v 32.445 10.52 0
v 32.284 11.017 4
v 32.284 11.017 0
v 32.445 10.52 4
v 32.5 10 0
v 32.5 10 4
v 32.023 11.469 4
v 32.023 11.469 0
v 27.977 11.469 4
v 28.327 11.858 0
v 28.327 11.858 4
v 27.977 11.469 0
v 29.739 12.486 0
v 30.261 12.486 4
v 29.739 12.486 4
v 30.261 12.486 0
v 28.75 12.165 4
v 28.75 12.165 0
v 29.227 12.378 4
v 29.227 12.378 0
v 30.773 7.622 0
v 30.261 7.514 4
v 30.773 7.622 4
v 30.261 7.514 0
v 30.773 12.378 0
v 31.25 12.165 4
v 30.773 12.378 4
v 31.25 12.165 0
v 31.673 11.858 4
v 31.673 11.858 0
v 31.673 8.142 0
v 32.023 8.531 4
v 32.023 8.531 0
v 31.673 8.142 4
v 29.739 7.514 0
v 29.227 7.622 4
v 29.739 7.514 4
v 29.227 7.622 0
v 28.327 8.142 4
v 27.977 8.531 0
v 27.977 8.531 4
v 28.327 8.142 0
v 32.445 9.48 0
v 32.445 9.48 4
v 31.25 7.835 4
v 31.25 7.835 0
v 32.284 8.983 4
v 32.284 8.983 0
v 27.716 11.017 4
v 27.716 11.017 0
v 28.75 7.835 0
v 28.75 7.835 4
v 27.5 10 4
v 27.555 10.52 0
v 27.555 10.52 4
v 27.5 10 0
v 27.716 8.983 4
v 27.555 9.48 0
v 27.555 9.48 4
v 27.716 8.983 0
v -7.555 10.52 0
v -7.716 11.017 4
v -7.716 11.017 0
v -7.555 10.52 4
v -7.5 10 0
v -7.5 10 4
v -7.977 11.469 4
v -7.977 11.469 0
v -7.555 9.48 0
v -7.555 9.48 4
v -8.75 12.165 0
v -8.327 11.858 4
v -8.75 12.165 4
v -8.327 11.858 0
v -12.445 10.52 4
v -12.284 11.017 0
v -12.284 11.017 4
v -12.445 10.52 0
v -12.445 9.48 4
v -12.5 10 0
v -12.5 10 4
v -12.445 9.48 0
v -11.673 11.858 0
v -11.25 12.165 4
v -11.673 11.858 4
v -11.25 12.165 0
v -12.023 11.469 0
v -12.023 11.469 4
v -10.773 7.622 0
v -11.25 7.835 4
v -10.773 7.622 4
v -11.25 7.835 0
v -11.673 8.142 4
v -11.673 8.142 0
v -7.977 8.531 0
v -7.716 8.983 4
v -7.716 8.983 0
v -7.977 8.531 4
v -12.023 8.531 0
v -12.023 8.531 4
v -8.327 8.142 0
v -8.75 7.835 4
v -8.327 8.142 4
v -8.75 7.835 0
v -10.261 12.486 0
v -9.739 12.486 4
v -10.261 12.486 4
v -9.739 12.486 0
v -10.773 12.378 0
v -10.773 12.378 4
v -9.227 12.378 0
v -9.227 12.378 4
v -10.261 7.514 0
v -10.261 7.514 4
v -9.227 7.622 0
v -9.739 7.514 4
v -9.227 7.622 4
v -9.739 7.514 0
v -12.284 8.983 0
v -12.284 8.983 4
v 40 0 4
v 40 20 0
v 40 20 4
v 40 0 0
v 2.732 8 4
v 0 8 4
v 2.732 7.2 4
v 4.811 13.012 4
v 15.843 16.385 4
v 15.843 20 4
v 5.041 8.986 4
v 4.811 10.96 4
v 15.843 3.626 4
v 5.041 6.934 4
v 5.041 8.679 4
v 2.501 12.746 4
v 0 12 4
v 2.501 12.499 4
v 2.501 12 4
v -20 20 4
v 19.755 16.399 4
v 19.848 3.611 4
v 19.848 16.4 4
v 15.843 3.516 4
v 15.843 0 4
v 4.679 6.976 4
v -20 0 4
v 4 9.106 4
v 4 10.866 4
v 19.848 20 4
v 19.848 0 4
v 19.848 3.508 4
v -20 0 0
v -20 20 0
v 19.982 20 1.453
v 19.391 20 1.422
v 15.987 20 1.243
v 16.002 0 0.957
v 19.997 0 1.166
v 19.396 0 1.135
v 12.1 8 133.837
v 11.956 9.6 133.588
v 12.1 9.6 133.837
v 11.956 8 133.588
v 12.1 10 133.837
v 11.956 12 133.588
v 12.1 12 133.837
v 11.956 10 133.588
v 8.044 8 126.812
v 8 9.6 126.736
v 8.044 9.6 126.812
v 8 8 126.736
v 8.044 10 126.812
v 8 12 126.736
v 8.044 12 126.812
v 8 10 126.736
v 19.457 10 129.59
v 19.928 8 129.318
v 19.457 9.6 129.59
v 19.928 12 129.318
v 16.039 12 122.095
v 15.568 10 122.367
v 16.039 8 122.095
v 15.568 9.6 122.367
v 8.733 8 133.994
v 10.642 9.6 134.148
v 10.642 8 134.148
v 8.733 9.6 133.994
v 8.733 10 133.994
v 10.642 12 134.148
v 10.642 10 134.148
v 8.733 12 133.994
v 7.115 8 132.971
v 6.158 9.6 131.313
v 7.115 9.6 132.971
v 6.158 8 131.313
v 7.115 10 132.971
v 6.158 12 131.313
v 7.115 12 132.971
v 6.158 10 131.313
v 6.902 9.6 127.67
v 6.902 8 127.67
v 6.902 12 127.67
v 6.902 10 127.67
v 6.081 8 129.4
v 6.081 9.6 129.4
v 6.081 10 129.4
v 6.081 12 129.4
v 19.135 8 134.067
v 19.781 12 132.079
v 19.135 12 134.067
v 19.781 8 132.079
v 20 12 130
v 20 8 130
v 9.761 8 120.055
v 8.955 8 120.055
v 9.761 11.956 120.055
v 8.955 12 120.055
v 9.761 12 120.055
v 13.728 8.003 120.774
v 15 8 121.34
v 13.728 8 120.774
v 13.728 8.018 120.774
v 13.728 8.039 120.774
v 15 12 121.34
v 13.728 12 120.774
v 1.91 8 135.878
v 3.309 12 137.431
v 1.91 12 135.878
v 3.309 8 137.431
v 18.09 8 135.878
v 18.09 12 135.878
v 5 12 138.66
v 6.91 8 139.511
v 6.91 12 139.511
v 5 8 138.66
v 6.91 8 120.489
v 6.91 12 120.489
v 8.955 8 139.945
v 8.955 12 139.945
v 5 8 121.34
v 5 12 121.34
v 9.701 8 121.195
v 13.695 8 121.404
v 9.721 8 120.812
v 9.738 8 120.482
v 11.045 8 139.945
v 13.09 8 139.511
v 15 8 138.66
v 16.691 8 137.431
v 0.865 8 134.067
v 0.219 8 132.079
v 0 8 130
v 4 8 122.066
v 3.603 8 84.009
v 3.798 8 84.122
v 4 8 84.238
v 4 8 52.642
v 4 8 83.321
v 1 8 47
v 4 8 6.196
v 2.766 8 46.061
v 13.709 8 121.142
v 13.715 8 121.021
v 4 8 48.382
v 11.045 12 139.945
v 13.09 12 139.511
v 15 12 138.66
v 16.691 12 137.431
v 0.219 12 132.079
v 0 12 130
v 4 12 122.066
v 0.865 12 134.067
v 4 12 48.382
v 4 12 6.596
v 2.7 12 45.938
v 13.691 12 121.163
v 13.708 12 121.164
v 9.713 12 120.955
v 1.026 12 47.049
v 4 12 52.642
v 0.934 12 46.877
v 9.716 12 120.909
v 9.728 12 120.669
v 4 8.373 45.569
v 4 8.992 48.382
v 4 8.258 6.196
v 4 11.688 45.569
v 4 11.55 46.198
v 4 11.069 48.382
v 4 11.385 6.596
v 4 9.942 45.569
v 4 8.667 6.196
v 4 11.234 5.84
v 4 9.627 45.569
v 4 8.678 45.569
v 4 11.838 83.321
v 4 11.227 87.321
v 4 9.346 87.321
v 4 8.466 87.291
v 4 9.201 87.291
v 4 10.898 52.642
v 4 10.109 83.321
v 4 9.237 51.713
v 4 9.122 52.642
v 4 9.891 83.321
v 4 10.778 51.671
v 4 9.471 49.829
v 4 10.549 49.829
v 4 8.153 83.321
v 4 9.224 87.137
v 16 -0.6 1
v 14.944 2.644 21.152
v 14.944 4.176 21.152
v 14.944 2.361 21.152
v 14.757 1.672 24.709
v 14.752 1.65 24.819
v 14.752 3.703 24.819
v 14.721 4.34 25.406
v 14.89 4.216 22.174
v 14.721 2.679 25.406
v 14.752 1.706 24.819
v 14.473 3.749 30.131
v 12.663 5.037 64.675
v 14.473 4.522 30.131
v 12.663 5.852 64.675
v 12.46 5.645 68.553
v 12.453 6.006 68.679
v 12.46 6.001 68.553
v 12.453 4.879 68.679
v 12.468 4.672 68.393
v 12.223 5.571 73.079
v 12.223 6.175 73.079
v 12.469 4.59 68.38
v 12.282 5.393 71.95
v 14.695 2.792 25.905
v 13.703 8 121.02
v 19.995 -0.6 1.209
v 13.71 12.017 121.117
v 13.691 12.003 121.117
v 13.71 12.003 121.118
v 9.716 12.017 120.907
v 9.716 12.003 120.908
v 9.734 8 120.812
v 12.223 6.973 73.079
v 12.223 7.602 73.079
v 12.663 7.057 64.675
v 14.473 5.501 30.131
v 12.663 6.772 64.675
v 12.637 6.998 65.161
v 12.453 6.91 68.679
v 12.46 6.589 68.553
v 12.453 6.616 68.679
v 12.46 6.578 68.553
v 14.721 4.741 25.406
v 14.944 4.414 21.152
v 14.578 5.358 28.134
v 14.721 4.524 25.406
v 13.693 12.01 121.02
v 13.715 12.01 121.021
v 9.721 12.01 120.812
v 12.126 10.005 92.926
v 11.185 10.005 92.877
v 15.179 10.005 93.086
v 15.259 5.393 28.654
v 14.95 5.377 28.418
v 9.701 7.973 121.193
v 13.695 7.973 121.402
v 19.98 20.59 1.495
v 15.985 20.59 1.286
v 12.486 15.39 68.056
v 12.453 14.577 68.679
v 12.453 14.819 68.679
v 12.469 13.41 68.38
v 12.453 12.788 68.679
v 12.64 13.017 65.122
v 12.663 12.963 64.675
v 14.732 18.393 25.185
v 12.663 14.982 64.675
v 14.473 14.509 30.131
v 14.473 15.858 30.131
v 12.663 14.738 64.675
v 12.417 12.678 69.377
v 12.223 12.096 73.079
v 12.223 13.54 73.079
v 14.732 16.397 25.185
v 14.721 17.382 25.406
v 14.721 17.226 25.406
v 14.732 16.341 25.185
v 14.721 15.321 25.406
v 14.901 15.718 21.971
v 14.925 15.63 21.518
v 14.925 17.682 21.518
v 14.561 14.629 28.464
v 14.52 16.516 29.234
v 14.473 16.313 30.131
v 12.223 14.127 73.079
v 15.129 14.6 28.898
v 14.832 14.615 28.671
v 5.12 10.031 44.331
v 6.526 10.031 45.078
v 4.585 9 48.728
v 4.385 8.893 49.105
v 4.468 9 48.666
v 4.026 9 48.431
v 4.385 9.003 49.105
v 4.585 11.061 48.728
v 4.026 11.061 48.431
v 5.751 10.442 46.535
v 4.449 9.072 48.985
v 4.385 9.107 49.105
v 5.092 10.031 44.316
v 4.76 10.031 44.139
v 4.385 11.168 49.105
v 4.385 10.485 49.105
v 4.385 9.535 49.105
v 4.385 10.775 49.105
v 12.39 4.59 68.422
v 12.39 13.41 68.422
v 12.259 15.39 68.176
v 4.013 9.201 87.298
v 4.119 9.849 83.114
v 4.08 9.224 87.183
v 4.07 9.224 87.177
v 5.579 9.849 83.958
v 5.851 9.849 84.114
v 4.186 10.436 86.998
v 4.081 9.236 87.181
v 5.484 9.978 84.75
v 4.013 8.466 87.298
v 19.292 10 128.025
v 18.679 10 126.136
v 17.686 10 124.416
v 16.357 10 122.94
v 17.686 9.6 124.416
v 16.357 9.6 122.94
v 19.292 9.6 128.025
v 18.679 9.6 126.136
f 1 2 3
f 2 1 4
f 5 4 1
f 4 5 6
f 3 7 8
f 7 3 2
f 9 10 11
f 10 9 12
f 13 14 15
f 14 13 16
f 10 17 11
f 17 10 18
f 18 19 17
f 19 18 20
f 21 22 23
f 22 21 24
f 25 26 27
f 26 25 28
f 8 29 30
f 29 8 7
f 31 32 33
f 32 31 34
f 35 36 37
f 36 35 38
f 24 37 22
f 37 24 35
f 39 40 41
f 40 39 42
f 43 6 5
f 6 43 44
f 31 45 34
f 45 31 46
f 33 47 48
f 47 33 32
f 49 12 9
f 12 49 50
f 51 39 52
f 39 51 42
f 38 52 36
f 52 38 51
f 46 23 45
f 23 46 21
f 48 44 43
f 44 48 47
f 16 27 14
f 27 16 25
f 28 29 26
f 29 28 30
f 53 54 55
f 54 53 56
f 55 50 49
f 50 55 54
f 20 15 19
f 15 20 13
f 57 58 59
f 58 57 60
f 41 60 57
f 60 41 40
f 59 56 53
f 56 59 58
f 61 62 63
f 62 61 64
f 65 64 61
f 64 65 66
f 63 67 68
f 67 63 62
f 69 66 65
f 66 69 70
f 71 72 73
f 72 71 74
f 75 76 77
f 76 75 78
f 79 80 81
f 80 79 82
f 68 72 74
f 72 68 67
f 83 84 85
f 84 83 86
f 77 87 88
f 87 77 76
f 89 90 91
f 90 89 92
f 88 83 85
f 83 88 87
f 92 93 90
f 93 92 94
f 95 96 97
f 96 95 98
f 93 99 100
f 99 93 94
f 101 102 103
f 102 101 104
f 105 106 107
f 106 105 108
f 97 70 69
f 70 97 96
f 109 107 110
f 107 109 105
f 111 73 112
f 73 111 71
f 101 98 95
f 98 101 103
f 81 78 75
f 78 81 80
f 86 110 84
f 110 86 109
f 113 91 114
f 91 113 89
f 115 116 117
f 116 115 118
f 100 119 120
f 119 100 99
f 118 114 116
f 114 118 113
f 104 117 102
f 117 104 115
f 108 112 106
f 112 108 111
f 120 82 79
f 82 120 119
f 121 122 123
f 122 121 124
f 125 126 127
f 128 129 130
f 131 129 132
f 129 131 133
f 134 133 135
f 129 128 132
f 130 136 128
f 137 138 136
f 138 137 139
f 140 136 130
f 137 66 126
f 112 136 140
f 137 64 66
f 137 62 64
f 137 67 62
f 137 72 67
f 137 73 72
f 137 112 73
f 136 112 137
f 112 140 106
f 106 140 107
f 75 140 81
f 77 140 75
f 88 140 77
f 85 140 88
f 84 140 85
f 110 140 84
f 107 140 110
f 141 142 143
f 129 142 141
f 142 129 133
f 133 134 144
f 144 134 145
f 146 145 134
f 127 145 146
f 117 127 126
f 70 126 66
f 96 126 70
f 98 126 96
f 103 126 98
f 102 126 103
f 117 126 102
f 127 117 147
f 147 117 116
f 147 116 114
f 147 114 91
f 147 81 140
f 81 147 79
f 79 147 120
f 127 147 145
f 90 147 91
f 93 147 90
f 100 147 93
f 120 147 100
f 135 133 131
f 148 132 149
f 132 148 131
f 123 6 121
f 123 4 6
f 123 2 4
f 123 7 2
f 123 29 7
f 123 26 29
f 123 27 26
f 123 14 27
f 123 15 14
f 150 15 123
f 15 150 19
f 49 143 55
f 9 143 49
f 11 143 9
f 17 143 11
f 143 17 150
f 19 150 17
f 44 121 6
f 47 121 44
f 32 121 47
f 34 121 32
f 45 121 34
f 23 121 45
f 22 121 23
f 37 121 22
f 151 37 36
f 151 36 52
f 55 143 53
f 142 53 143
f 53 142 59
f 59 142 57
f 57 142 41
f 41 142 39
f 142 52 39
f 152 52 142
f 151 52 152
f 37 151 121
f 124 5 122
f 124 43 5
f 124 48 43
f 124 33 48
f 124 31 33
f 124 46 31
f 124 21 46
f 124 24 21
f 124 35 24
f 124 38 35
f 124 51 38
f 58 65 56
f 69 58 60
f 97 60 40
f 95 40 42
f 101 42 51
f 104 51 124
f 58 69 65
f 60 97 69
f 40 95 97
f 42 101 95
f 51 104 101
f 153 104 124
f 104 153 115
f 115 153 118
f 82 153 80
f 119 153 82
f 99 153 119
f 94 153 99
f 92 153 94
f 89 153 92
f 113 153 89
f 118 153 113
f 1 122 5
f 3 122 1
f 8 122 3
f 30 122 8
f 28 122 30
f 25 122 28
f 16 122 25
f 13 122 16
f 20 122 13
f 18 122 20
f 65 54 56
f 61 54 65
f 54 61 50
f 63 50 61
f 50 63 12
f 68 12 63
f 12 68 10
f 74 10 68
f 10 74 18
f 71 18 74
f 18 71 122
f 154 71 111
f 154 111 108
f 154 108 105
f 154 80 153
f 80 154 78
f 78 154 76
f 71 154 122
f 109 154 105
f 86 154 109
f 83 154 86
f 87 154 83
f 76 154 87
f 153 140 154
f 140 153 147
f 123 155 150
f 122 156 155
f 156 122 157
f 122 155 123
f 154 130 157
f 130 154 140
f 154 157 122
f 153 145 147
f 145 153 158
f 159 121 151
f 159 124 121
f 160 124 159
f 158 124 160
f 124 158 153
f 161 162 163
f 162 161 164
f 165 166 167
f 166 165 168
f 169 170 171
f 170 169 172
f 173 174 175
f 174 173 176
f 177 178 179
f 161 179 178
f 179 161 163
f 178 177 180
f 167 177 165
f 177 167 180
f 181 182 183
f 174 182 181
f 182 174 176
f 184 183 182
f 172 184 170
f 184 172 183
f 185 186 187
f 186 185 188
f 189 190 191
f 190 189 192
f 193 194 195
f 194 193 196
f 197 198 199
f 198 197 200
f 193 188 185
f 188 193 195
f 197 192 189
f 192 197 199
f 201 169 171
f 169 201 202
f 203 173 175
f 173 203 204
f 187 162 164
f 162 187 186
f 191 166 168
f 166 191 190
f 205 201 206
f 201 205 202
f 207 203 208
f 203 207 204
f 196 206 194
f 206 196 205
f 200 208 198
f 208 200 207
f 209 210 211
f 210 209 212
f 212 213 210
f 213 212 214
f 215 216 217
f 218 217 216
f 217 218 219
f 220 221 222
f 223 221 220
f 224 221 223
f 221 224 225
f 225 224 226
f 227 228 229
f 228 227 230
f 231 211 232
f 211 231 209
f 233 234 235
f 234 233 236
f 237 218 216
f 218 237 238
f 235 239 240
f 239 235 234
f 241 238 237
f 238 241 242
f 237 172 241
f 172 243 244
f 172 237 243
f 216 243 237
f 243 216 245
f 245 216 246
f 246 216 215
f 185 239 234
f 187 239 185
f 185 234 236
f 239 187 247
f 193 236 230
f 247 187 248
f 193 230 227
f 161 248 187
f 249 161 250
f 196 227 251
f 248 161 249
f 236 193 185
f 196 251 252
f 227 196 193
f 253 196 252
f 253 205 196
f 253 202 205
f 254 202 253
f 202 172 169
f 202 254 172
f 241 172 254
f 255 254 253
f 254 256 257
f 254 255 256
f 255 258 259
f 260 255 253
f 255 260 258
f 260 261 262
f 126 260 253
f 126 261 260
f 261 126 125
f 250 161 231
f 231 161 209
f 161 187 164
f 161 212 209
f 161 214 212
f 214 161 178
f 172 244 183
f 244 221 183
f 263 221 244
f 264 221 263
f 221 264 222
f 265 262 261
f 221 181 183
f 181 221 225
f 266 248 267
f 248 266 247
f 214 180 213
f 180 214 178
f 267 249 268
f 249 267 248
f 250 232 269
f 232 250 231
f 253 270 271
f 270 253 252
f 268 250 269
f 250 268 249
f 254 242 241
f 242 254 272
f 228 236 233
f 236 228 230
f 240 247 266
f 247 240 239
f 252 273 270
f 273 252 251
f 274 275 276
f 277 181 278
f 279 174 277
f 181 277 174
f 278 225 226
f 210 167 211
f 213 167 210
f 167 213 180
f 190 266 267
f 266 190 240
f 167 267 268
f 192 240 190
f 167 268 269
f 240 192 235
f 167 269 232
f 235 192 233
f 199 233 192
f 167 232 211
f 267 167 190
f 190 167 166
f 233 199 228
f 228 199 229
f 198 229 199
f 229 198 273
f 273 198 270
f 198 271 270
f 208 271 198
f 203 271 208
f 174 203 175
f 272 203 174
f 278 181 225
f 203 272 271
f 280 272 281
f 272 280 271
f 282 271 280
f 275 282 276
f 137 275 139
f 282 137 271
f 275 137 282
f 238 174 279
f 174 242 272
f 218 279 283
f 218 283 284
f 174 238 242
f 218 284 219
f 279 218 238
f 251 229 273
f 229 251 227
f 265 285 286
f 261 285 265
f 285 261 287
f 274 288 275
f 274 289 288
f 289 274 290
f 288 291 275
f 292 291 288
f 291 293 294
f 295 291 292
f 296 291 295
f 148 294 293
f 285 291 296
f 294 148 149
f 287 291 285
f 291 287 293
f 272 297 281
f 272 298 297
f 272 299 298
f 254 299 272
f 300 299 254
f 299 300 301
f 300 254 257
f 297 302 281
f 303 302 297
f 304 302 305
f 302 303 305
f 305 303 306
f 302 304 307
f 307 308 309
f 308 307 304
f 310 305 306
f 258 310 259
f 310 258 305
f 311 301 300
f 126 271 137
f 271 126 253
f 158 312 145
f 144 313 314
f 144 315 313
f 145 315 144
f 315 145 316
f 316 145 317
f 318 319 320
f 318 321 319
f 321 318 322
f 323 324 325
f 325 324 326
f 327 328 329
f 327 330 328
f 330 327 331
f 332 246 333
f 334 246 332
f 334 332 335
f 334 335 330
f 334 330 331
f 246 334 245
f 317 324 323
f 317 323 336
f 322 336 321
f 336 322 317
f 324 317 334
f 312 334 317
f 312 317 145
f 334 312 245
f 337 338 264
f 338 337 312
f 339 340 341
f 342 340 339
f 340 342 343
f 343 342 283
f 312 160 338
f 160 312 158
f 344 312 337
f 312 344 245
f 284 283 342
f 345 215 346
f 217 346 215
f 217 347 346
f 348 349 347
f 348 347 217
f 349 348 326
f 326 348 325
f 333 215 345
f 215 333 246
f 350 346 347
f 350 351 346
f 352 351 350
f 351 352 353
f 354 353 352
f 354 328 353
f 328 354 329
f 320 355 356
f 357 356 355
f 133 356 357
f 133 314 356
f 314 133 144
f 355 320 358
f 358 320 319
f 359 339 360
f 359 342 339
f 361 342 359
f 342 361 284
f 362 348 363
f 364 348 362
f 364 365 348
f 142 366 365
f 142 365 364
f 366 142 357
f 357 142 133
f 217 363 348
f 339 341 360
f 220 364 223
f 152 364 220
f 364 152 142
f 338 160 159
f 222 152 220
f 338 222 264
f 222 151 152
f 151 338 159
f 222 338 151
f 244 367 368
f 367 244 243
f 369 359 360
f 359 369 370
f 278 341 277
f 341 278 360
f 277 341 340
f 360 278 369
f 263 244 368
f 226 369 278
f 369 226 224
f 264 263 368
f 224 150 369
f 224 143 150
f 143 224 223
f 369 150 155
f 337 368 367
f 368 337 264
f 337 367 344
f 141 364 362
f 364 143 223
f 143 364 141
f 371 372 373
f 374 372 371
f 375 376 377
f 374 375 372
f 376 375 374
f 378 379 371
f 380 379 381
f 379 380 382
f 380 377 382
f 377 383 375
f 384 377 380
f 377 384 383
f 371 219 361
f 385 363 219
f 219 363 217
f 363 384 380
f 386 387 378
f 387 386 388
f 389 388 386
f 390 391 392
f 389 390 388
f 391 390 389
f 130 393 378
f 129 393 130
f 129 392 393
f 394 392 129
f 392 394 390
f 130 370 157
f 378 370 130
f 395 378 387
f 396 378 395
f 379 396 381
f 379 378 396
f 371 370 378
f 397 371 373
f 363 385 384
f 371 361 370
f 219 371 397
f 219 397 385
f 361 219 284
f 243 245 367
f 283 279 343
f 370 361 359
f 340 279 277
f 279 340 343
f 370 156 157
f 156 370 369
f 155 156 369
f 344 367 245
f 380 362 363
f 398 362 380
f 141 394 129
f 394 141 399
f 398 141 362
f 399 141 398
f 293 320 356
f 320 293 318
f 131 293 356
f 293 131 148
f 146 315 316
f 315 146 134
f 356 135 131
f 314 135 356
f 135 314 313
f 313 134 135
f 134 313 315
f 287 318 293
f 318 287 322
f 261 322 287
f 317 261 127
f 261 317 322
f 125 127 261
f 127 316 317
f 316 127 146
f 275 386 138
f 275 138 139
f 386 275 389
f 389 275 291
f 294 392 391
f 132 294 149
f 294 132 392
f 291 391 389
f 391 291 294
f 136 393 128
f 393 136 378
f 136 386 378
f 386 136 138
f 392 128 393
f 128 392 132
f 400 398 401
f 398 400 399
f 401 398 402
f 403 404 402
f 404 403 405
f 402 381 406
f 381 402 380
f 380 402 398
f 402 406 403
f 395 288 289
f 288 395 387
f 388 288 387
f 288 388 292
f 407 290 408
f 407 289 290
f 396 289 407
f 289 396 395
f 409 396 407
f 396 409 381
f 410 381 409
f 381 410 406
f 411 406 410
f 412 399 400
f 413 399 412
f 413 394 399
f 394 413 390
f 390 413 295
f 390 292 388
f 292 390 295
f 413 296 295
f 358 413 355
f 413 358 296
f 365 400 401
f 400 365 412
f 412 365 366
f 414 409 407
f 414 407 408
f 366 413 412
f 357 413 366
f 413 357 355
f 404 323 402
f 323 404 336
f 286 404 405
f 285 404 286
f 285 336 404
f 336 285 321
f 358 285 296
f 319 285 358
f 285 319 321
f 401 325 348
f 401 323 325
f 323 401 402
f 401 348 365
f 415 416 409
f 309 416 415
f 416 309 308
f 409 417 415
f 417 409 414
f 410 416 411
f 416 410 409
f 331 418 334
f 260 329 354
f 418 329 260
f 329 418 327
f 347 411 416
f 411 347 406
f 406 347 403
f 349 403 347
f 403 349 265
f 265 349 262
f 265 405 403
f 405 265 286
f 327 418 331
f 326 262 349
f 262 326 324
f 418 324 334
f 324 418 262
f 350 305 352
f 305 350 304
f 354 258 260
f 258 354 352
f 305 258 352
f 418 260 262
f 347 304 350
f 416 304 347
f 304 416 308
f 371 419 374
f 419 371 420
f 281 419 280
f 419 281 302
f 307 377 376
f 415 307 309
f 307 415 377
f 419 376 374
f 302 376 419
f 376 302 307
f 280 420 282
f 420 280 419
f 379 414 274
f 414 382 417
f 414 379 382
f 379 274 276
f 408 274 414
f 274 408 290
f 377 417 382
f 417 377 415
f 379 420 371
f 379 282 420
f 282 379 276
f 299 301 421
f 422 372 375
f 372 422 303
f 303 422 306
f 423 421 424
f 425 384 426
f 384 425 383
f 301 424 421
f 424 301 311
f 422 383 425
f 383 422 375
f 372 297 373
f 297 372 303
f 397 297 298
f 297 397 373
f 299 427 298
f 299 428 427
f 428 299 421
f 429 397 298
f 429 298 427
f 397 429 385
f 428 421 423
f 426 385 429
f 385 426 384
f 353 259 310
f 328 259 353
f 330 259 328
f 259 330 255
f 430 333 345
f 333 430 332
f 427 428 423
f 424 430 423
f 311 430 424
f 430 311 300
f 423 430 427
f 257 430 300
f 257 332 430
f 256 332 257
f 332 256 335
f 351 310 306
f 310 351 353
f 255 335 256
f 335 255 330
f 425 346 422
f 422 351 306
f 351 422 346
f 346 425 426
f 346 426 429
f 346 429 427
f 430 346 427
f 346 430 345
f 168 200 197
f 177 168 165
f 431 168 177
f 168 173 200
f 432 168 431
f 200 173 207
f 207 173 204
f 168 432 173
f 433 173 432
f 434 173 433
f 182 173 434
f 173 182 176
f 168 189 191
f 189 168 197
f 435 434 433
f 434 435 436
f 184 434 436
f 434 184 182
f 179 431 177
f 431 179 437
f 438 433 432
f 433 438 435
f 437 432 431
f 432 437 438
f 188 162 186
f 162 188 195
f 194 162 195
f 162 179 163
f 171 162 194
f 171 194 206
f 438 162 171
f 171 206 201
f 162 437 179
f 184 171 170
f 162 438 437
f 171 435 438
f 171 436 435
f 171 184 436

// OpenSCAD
// Filament Spool Hanging/Standing Mount
//
// Title:        Filament Spool Hanging/Standing Mount Frame
// Version:      1.007
// Release Date: 20170508 (ISO)
// Author:       David Larsson
// License:      Creative Commons - Attribution - Non-Commercial - Share Alike
//

// filament spool mount orientation
mo=1; // [0:"standing",1:"hanging"]

// mount height
he=130; // [120:140]

// leg thickness
th=4; // [4:6]

// diameter of spool carrying bolt
di=8; // [4:10]

//foot
difference() {
    translate([-20,0,0])
        cube([60,20,th]);
    union() {
        translate([30,20/2,-0.3])
            cylinder(20,2.5,2.5,$fn=30);
        translate([-10,20/2,-0.3])
            cylinder(20,2.5,2.5,$fn=30);
    }
}

//back support
translate([0,(20-th)/2,0])
    cube([th,th,he]);

//side support
translate([20-th,-.6,th/4])
    rotate([-4.1,-3,0])
        cube([th,th,he-20/2+th/6]);
color("green")
translate([20-th,20-th+.6,th/4])
    rotate([4.1,-3,0])
        cube([th,th,he-20/2+th/6]);

//1st back support
translate([th/4,20/2-th/2,th/4])
    rotate([13,30,0])
    cube([th/2,th/2,33-th]);
//color("red")
translate([th/4,20/2,th/4+.4])
    rotate([-13,30,0])
    cube([th/2,th/2,33-th]);

//2nd back support
translate([20-th,20-th,23])
    rotate([14,-28,0])
    cube([th/2,th/2,35-th]);
translate([20-th,th/2,23])
    rotate([-14,-28,0])
    cube([th/2,th/2,35-th]);

//3rd back support
translate([th/4,20/2-th/2,47])
    rotate([8,28,0])
    cube([th/2,th/2,30.5-1.5*th]);
translate([th/4,20/2,47])
    rotate([-8,28,0])
    cube([th/2,th/2,30.5-1.5*th]);

//4th back support
color("red")
translate([20-1.5*th,14-th/6,66])
    rotate([10,-30,0])
    cube([th/2,th/2,29-1.3*th]);
translate([20-1.5*th,5-th/6,66])
    rotate([-10,-30,0])
    cube([th/2,th/2,29-1.3*th]);

//hold grip
difference() {
  translate([20/2,(20+th)/2,he])
    rotate([90,0,0])
        cylinder(th,20/2,20/2);
color("red")
  translate([20/2,(20/2+th),he-di*.7/2+di/2-1])
    rotate([90,-40+mo*70,0]) {
   translate([0,-di/2,0])
       cube([he,di+.2,2*th]);
    cylinder(th+4,di/2,di/2);
    }
}

//hold grip print support
translate([20/2,(20)/2,he])
    rotate([90,0,0])
        cylinder(.4,20/2-.5,20/2-.5);
